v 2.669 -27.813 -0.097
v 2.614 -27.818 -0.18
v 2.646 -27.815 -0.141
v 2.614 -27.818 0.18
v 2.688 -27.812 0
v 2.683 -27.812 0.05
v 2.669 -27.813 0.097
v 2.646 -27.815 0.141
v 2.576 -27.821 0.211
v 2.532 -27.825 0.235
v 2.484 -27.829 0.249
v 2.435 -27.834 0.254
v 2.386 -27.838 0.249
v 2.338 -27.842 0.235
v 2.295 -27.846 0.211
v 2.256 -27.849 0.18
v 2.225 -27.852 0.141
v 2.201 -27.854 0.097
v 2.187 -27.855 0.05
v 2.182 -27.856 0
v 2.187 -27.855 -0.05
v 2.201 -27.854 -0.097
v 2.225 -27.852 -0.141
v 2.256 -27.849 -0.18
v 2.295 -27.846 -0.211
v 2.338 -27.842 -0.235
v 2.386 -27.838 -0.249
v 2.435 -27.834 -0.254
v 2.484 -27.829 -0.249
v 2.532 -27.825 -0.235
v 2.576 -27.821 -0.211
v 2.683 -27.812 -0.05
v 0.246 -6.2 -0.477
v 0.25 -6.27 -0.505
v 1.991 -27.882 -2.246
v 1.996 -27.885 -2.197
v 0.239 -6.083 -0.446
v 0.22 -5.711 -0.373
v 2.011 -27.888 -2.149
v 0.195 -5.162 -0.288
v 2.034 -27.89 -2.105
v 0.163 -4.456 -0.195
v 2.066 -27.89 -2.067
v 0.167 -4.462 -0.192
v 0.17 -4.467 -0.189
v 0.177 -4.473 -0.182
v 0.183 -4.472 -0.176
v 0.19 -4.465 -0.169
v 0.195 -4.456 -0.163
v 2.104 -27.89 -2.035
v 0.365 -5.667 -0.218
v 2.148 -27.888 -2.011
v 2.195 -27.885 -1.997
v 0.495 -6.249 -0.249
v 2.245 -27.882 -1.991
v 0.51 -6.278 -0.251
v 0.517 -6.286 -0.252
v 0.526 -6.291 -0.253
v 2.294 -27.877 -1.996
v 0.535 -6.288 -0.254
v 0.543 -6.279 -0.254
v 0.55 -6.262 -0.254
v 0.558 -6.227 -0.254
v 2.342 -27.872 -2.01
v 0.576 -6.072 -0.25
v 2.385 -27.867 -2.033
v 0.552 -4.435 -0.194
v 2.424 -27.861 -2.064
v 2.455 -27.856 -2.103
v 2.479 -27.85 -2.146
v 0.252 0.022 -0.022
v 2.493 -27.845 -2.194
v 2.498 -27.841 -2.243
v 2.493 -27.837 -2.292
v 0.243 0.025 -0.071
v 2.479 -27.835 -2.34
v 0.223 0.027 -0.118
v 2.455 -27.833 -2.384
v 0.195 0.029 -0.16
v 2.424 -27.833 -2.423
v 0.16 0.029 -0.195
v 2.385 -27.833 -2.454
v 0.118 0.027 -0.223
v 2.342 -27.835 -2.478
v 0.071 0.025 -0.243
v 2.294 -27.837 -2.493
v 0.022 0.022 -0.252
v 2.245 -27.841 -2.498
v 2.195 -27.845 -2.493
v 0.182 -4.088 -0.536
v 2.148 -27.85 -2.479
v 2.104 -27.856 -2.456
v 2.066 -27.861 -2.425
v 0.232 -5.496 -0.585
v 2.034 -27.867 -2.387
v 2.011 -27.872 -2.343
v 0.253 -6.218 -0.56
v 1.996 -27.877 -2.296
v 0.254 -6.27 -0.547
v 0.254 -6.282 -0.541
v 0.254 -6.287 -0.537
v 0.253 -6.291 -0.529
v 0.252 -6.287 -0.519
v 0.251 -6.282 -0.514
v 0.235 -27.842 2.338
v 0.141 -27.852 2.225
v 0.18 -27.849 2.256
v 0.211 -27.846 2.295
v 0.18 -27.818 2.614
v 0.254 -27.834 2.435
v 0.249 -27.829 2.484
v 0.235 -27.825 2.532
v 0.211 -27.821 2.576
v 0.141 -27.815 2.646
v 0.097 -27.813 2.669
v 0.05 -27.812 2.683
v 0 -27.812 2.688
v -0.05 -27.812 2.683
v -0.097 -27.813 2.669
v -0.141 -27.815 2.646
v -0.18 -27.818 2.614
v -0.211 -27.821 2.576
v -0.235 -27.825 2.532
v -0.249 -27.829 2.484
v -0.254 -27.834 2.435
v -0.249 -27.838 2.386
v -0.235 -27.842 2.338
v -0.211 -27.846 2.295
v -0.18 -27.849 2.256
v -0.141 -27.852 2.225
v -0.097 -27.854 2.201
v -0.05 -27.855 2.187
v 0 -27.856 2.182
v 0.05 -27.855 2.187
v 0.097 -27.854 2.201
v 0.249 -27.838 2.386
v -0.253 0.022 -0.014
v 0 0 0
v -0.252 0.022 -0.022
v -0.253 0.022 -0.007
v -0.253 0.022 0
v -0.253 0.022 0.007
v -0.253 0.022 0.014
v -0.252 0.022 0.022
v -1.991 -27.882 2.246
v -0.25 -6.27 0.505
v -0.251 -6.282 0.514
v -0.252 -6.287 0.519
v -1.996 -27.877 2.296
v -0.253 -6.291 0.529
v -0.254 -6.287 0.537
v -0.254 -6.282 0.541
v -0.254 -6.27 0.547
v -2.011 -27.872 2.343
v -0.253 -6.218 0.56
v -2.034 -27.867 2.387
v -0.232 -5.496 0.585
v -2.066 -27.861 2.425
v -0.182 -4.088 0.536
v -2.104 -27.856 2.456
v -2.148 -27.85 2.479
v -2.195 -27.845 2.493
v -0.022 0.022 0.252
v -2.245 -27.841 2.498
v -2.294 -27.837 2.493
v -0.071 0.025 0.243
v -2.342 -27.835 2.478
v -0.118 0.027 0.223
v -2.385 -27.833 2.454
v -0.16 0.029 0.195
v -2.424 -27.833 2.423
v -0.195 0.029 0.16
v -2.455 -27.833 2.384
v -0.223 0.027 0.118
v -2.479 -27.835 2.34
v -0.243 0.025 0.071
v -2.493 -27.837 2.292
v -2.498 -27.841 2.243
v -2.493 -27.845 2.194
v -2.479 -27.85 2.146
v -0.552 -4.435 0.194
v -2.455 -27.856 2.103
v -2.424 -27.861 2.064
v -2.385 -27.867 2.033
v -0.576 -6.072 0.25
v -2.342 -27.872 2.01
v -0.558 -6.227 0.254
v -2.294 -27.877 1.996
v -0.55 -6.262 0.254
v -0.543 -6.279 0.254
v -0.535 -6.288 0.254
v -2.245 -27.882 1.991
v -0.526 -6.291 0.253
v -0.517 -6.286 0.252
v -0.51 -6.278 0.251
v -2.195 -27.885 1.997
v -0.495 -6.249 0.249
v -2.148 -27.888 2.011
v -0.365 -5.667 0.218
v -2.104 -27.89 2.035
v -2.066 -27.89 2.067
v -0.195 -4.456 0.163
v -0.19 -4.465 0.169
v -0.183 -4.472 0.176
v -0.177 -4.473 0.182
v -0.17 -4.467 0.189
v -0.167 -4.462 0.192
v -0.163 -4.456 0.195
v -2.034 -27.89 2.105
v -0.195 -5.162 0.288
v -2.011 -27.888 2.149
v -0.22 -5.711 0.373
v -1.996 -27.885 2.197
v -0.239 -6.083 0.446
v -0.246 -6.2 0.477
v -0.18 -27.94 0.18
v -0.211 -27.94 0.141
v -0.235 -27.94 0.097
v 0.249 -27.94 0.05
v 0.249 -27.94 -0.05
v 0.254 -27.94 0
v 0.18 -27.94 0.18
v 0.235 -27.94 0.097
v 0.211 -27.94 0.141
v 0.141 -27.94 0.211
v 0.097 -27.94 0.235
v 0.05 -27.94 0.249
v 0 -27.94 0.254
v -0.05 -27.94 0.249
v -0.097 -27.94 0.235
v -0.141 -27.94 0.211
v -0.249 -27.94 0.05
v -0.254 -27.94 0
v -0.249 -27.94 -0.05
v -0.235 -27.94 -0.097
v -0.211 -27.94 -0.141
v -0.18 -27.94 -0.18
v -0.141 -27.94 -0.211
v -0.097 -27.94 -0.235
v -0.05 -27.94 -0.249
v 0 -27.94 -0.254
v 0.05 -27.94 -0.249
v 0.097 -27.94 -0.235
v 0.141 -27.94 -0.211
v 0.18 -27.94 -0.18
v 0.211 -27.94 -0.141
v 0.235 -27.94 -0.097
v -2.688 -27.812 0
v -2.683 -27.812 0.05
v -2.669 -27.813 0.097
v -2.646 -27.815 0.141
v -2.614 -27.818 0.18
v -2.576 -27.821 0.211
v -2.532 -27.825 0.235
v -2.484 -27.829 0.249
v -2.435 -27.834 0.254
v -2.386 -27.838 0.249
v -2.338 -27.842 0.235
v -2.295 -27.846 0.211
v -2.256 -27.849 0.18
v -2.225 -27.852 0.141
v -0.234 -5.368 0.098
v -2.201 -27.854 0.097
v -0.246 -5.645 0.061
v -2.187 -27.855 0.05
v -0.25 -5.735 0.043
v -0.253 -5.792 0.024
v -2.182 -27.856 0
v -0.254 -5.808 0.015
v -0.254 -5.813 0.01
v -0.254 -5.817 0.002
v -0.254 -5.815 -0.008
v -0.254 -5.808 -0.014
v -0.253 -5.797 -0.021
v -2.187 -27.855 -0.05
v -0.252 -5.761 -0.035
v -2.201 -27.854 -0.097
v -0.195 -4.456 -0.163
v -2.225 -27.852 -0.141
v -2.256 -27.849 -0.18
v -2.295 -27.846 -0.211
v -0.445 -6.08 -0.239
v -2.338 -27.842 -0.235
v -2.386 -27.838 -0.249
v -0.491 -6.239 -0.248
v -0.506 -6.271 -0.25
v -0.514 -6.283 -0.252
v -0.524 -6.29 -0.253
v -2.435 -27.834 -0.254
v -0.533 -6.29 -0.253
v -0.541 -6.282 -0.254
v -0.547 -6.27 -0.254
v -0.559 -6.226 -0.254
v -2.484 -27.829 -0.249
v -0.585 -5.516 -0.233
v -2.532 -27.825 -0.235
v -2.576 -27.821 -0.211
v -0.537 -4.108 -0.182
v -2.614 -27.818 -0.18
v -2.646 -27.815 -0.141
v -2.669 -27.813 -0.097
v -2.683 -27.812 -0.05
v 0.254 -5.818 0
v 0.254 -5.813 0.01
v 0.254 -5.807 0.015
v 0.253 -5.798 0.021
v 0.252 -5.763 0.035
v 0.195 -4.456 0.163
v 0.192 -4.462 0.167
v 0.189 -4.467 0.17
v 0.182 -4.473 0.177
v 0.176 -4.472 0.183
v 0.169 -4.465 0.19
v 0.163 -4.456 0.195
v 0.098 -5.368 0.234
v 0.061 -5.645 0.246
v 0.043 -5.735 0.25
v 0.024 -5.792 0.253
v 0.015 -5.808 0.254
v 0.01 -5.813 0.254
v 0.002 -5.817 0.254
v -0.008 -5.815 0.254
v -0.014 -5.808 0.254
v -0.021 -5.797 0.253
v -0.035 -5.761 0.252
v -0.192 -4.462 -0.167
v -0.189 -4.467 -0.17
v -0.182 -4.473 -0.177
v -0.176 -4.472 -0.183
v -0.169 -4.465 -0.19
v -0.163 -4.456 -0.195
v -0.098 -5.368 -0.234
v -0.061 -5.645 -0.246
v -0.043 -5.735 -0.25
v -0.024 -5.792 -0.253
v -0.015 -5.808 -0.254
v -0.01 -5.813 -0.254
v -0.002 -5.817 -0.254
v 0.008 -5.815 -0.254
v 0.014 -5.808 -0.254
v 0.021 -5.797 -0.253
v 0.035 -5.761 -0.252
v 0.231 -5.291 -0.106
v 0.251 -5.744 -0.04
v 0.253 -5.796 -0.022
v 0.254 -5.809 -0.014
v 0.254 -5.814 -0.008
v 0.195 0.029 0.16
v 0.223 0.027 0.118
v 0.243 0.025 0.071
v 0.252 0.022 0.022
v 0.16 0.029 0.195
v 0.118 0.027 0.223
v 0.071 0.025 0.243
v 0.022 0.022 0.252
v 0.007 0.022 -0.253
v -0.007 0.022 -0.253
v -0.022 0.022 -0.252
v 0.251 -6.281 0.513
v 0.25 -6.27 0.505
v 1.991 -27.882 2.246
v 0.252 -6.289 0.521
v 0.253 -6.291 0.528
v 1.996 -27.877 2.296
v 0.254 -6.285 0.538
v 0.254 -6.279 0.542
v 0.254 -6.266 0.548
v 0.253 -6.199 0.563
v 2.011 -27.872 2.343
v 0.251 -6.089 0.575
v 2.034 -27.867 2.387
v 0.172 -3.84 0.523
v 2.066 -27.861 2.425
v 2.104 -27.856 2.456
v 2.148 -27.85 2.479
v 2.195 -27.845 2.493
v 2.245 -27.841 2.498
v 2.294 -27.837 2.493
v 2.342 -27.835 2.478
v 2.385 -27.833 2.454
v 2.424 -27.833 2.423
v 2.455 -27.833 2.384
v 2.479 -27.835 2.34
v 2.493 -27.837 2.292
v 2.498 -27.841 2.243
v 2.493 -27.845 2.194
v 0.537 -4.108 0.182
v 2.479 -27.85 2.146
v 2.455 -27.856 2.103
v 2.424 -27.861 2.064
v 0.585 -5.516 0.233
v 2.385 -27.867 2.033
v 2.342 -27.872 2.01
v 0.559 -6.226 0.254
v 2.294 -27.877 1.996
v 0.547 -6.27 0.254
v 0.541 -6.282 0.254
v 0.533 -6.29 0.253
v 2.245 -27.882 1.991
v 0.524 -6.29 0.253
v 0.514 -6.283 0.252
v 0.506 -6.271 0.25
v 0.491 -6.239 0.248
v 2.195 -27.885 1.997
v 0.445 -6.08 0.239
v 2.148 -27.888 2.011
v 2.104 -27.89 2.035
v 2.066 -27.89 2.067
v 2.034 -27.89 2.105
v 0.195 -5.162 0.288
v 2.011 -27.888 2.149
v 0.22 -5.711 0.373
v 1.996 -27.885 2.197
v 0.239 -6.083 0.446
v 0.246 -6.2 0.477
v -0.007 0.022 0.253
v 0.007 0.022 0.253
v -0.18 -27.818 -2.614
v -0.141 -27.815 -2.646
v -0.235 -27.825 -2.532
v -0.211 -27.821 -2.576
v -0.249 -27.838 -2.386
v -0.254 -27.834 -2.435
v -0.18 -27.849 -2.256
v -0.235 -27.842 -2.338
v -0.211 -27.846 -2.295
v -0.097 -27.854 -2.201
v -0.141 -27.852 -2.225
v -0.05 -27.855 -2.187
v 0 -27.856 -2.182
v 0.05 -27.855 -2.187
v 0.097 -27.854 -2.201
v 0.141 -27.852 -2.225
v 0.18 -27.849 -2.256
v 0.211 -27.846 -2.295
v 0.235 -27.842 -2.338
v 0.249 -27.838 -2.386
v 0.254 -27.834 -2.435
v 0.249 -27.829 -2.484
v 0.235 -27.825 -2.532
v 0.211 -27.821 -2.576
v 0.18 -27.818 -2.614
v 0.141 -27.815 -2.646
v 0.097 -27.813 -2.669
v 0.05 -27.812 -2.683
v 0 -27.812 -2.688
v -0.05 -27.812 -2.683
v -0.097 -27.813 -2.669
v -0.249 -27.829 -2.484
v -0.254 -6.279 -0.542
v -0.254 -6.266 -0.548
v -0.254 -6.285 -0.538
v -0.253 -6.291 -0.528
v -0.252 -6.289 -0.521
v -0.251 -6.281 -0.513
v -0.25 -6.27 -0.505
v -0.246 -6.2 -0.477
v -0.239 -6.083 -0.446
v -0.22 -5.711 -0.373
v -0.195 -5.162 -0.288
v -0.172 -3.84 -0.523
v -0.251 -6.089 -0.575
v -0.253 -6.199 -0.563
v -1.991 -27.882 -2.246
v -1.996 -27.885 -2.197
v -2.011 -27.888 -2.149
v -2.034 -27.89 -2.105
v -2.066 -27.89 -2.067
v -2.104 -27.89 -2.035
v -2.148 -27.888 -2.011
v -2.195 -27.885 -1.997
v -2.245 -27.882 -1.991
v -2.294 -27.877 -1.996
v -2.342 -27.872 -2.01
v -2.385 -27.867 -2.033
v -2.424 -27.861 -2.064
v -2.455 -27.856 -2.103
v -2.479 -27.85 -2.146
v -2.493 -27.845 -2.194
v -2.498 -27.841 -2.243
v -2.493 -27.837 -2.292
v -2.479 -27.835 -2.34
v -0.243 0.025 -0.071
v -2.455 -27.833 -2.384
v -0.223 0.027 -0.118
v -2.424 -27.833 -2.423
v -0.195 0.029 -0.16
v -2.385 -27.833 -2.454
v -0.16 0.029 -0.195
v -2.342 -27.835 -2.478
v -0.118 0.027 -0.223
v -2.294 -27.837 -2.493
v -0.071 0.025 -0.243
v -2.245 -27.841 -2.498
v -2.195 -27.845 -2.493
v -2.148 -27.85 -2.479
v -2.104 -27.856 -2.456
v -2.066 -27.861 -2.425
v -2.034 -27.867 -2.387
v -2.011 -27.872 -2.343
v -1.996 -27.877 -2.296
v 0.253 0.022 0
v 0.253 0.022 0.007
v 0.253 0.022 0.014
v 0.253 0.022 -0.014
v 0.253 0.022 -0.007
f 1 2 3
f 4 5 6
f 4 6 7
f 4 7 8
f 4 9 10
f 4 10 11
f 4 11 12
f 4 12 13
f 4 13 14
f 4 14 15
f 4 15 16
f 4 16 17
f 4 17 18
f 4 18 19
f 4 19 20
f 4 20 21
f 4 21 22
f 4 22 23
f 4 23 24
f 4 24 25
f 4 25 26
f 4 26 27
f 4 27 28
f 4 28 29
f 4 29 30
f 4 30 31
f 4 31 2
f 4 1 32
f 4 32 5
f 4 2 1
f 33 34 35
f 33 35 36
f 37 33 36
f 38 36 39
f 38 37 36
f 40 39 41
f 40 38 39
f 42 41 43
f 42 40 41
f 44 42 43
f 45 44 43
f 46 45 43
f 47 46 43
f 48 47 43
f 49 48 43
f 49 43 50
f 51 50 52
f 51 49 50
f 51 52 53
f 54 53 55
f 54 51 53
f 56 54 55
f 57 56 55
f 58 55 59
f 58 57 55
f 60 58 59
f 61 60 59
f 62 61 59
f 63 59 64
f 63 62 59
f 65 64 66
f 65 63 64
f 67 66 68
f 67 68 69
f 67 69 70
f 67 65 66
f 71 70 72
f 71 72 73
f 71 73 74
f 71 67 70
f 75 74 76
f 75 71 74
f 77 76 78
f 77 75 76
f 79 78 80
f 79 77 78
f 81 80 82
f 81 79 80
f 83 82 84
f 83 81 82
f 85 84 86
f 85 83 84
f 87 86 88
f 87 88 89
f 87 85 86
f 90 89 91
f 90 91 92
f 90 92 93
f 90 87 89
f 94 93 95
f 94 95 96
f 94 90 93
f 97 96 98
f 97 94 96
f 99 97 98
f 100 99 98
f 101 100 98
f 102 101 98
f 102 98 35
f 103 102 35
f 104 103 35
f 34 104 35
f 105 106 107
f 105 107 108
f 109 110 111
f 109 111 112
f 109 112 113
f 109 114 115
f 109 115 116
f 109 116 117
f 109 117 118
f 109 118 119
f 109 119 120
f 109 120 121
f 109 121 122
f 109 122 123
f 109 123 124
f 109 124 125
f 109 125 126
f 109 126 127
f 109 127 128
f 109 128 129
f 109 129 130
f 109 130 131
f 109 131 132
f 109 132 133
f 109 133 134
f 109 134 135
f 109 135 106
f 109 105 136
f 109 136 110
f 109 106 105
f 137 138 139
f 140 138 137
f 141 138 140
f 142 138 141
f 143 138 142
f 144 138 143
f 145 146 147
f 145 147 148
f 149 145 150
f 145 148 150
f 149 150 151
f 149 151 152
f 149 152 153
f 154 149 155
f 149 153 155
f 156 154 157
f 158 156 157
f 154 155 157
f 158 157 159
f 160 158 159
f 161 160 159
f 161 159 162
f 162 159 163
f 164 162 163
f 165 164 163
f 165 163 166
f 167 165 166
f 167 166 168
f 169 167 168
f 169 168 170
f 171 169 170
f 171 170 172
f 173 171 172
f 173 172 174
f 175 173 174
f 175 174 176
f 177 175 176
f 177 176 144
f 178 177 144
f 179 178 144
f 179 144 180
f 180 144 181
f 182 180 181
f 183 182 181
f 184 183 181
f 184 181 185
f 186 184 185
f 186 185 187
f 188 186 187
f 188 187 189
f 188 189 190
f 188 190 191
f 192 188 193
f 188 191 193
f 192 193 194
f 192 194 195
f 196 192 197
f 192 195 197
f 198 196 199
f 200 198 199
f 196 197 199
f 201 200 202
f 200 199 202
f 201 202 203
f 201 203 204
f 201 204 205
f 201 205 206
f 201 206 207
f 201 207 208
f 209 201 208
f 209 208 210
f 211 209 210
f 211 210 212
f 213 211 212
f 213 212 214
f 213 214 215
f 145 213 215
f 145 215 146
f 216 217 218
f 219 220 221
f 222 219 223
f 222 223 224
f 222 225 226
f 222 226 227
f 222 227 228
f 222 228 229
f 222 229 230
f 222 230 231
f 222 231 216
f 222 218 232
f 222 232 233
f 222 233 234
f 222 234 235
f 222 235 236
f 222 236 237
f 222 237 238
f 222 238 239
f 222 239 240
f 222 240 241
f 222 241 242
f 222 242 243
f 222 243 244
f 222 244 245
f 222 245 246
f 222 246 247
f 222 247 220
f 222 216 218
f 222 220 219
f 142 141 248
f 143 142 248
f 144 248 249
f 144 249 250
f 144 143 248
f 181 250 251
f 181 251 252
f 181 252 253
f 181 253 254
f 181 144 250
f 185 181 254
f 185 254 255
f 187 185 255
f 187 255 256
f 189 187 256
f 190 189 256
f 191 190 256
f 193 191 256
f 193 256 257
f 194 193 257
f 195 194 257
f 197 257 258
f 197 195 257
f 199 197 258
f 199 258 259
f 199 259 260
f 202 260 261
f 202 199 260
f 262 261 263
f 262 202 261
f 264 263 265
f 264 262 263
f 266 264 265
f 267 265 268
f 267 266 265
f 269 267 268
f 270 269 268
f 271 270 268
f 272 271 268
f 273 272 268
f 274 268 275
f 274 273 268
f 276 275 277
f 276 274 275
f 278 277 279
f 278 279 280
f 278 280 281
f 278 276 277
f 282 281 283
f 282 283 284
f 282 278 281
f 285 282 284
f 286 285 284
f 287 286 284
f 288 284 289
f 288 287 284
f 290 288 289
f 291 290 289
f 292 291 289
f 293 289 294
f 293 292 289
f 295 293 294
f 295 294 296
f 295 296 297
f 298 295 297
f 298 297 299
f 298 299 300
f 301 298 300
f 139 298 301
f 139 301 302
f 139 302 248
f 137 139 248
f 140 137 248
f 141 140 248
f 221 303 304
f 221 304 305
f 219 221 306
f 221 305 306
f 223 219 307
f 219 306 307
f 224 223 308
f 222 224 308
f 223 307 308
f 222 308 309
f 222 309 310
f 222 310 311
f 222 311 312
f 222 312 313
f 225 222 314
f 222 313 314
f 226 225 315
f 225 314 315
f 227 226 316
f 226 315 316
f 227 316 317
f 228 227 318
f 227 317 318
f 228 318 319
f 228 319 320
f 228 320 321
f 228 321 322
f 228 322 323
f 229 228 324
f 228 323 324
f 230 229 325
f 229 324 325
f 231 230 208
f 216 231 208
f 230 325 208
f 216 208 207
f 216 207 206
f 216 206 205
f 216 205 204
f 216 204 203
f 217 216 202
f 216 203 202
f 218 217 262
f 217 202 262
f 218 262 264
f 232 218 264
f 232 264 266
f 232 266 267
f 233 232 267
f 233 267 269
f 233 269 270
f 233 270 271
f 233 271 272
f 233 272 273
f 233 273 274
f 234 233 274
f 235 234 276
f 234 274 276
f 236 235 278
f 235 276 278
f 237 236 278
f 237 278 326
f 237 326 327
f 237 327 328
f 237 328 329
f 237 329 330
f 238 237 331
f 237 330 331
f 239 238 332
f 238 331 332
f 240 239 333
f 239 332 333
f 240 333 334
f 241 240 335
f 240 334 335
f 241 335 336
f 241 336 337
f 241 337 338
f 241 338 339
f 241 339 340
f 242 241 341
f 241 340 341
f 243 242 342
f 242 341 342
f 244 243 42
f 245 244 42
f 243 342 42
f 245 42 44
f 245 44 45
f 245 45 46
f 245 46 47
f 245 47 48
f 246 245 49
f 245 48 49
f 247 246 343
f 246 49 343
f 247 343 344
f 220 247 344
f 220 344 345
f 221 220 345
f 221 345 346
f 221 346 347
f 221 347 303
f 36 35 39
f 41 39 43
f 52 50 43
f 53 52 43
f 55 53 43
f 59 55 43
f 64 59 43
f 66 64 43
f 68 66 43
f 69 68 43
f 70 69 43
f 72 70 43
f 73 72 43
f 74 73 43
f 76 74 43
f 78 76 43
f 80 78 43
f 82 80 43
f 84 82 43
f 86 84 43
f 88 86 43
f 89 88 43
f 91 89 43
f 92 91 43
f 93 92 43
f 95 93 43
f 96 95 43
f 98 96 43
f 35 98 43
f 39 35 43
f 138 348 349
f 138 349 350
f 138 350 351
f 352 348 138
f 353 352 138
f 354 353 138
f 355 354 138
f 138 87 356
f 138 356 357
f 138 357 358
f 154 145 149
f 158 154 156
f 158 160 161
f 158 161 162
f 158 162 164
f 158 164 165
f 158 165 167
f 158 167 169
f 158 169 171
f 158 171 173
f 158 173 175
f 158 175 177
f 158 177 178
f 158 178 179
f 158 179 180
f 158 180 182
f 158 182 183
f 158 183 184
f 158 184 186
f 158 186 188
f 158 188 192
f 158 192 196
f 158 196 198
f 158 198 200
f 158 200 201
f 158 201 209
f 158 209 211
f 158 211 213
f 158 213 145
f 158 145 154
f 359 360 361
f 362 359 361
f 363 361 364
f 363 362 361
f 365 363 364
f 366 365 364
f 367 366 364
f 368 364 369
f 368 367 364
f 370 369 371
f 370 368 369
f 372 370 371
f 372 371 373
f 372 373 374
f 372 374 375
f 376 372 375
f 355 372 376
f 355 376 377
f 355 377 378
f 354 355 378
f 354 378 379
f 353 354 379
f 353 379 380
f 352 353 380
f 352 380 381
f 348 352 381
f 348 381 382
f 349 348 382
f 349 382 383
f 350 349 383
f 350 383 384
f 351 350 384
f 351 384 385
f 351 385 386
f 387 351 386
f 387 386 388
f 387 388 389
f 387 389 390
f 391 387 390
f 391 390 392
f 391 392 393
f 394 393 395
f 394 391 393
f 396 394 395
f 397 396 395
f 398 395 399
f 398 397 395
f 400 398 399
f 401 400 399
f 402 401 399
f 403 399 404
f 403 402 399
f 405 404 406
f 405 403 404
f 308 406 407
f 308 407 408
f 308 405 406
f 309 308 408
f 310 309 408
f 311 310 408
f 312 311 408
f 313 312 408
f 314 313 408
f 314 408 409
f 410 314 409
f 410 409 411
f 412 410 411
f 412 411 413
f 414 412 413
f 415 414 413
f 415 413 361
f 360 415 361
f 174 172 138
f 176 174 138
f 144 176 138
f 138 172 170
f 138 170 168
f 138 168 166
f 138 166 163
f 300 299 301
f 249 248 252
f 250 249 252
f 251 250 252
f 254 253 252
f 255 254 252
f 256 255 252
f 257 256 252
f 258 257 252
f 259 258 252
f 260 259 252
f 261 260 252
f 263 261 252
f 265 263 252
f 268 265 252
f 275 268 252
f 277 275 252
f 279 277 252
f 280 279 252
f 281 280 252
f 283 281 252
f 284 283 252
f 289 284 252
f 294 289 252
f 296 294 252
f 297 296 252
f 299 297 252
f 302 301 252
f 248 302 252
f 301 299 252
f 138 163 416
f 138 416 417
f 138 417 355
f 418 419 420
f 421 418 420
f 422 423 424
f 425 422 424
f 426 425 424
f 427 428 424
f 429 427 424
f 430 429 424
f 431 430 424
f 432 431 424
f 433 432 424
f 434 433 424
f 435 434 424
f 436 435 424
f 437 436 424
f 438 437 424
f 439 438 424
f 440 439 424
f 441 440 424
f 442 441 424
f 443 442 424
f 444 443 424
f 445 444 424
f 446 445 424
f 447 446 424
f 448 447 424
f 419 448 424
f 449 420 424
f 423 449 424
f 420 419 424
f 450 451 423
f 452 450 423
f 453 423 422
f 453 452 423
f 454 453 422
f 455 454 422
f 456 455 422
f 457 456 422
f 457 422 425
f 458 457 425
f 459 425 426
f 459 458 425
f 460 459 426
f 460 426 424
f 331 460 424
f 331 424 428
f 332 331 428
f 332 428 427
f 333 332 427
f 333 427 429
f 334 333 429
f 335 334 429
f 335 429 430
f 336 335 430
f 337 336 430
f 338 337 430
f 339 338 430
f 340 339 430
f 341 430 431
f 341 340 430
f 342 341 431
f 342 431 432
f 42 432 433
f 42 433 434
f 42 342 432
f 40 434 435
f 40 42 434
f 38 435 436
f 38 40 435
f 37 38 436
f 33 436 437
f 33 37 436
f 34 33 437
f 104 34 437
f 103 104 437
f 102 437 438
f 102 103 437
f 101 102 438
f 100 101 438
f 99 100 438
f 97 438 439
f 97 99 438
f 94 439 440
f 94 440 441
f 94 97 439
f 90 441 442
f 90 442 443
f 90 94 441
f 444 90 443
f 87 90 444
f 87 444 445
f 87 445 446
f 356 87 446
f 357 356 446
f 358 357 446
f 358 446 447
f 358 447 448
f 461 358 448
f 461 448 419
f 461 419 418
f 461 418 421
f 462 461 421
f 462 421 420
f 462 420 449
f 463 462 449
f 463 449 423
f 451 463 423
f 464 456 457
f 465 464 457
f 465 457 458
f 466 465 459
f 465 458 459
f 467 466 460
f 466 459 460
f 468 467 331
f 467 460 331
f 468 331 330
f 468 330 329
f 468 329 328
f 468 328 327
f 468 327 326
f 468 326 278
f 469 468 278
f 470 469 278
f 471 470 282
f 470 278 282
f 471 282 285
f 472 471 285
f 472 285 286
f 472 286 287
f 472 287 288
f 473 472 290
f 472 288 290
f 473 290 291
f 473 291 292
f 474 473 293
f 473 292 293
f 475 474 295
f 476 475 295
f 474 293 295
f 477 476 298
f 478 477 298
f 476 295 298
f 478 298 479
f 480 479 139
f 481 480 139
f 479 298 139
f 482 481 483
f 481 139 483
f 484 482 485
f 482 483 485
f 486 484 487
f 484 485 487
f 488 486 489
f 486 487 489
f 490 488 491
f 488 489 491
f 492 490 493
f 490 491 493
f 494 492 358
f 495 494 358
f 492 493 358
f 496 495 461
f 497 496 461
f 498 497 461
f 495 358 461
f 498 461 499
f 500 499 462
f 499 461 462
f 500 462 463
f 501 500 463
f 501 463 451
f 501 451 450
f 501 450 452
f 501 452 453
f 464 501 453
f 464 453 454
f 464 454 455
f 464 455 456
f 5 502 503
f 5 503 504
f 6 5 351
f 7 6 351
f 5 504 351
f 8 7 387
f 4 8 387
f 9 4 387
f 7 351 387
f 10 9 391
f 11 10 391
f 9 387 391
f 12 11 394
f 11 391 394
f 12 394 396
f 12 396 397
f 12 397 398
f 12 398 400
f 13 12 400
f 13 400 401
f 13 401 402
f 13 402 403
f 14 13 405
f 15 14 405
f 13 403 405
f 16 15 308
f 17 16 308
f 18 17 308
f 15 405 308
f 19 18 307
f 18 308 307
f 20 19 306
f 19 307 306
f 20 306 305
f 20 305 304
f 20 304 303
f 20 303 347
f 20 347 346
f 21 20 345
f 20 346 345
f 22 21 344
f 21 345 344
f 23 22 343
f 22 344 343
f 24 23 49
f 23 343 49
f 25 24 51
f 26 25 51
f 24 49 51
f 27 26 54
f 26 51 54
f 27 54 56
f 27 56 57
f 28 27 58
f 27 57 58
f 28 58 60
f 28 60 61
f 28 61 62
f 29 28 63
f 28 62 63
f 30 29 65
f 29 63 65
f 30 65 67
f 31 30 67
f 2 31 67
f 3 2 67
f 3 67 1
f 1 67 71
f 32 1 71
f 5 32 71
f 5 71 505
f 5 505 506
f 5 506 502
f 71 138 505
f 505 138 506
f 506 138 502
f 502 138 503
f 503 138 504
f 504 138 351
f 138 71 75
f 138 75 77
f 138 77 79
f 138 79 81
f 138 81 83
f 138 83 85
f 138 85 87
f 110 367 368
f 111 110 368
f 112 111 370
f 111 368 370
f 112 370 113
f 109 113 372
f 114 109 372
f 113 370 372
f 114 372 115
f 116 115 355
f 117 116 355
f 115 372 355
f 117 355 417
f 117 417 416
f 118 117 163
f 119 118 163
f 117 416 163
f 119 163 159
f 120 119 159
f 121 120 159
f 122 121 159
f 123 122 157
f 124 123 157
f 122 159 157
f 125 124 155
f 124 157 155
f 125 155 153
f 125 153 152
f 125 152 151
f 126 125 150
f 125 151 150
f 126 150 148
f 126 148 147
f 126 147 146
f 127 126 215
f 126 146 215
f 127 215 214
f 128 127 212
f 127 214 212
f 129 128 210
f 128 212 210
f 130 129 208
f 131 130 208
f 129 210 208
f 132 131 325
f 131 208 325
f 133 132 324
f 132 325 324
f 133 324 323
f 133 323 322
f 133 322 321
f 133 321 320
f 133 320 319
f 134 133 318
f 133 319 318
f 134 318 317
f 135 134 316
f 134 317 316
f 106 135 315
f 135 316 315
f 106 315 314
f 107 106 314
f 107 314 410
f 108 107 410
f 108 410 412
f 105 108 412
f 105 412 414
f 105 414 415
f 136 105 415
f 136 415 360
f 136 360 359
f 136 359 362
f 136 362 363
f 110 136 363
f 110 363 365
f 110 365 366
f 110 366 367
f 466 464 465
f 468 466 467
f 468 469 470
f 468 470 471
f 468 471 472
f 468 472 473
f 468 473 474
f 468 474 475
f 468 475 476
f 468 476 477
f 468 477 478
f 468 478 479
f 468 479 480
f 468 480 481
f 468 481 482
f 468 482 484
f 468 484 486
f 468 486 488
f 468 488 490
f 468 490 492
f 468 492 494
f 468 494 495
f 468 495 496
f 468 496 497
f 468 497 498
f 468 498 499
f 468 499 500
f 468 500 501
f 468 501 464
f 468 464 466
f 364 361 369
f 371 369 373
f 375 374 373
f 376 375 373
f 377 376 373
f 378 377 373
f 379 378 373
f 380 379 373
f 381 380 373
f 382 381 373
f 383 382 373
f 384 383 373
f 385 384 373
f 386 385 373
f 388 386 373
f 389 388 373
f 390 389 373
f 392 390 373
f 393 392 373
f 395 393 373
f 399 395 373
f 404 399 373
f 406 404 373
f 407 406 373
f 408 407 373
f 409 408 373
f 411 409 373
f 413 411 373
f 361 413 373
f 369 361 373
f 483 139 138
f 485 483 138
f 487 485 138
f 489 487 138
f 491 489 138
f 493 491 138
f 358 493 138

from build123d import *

# Parameters (mm, degrees)
F0_R      = 0.254
F1_DEPTH  = 27.94
F4_R      = 0.254
F5_DEPTH  = 27.94
F7_R      = 0.254
F8_DEPTH  = 27.94
F11_R     = 0.254
F12_DEPTH = 27.94
F14_R     = 0.254
F15_DEPTH = 27.94
F18_R     = 0.254
F19_DEPTH = 28.0416
F21_R     = 0.254
F22_DEPTH = 28.0416
F24_R     = 0.254
F25_DEPTH = 28.0416
F27_R     = 0.254
F28_DEPTH = 28.0416


with BuildPart() as f1:
    # F0 (on Front) → F1 (new body)
    with BuildSketch(Plane.XZ):
        Circle(F0_R)
    extrude(amount=F1_DEPTH)

    # F4 (on line) → F5 (join)
    with BuildSketch(Plane(origin=(0, 0, 0), x_dir=(-0.9961946981, 0.0871557427, 0), z_dir=(0.0871557427, 0.9961946981, 0))):
        Circle(F4_R)
    extrude(amount=-F5_DEPTH)

    # F7 (on line) → F8 (join)
    with BuildSketch(Plane(origin=(0, 0, 0), x_dir=(0.9961946981, 0.0871557427, 0), z_dir=(0.0871557427, -0.9961946981, 0))):
        Circle(F7_R)
    extrude(amount=F8_DEPTH)

    # F11 (on line) → F12 (join)
    with BuildSketch(Plane(origin=(0, 0, 0), x_dir=(-1, 0, 0), z_dir=(0, 0.9961946981, 0.0871557427))):
        Circle(F11_R)
    extrude(amount=-F12_DEPTH)

    # F14 (on line) → F15 (join)
    with BuildSketch(Plane(origin=(0, 0, 0), x_dir=(1, 0, 0), z_dir=(0, -0.9961946981, 0.0871557427))):
        Circle(F14_R)
    extrude(amount=F15_DEPTH)

    # F18 (on line) → F19 (join)
    with BuildSketch(Plane(origin=(0, 0, 0), x_dir=(-0.9967911096, -0.0797882397, -0.0064281109), z_dir=(-0.0800467601, 0.9935718557, 0.0800467601))):
        Circle(F18_R)
    extrude(amount=-F19_DEPTH)

    # F21 (on line) → F22 (join)
    with BuildSketch(Plane(origin=(0, 0, 0), x_dir=(0.9967911096, -0.0797882397, 0.0064281109), z_dir=(-0.0800467601, -0.9935718557, 0.0800467601))):
        Circle(F21_R)
    extrude(amount=F22_DEPTH)

    # F24 (on line) → F25 (join)
    with BuildSketch(Plane(origin=(0, 0, 0), x_dir=(-0.9967911096, -0.0797882397, 0.0064281109), z_dir=(-0.0800467601, 0.9935718557, -0.0800467601))):
        Circle(F24_R)
    extrude(amount=-F25_DEPTH)

    # F27 (on line) → F28 (join)
    with BuildSketch(Plane(origin=(0, 0, 0), x_dir=(0.9967911096, -0.0797882397, -0.0064281109), z_dir=(-0.0800467601, -0.9935718557, -0.0800467601))):
        Circle(F27_R)
    extrude(amount=F28_DEPTH)


solid = f1.part
